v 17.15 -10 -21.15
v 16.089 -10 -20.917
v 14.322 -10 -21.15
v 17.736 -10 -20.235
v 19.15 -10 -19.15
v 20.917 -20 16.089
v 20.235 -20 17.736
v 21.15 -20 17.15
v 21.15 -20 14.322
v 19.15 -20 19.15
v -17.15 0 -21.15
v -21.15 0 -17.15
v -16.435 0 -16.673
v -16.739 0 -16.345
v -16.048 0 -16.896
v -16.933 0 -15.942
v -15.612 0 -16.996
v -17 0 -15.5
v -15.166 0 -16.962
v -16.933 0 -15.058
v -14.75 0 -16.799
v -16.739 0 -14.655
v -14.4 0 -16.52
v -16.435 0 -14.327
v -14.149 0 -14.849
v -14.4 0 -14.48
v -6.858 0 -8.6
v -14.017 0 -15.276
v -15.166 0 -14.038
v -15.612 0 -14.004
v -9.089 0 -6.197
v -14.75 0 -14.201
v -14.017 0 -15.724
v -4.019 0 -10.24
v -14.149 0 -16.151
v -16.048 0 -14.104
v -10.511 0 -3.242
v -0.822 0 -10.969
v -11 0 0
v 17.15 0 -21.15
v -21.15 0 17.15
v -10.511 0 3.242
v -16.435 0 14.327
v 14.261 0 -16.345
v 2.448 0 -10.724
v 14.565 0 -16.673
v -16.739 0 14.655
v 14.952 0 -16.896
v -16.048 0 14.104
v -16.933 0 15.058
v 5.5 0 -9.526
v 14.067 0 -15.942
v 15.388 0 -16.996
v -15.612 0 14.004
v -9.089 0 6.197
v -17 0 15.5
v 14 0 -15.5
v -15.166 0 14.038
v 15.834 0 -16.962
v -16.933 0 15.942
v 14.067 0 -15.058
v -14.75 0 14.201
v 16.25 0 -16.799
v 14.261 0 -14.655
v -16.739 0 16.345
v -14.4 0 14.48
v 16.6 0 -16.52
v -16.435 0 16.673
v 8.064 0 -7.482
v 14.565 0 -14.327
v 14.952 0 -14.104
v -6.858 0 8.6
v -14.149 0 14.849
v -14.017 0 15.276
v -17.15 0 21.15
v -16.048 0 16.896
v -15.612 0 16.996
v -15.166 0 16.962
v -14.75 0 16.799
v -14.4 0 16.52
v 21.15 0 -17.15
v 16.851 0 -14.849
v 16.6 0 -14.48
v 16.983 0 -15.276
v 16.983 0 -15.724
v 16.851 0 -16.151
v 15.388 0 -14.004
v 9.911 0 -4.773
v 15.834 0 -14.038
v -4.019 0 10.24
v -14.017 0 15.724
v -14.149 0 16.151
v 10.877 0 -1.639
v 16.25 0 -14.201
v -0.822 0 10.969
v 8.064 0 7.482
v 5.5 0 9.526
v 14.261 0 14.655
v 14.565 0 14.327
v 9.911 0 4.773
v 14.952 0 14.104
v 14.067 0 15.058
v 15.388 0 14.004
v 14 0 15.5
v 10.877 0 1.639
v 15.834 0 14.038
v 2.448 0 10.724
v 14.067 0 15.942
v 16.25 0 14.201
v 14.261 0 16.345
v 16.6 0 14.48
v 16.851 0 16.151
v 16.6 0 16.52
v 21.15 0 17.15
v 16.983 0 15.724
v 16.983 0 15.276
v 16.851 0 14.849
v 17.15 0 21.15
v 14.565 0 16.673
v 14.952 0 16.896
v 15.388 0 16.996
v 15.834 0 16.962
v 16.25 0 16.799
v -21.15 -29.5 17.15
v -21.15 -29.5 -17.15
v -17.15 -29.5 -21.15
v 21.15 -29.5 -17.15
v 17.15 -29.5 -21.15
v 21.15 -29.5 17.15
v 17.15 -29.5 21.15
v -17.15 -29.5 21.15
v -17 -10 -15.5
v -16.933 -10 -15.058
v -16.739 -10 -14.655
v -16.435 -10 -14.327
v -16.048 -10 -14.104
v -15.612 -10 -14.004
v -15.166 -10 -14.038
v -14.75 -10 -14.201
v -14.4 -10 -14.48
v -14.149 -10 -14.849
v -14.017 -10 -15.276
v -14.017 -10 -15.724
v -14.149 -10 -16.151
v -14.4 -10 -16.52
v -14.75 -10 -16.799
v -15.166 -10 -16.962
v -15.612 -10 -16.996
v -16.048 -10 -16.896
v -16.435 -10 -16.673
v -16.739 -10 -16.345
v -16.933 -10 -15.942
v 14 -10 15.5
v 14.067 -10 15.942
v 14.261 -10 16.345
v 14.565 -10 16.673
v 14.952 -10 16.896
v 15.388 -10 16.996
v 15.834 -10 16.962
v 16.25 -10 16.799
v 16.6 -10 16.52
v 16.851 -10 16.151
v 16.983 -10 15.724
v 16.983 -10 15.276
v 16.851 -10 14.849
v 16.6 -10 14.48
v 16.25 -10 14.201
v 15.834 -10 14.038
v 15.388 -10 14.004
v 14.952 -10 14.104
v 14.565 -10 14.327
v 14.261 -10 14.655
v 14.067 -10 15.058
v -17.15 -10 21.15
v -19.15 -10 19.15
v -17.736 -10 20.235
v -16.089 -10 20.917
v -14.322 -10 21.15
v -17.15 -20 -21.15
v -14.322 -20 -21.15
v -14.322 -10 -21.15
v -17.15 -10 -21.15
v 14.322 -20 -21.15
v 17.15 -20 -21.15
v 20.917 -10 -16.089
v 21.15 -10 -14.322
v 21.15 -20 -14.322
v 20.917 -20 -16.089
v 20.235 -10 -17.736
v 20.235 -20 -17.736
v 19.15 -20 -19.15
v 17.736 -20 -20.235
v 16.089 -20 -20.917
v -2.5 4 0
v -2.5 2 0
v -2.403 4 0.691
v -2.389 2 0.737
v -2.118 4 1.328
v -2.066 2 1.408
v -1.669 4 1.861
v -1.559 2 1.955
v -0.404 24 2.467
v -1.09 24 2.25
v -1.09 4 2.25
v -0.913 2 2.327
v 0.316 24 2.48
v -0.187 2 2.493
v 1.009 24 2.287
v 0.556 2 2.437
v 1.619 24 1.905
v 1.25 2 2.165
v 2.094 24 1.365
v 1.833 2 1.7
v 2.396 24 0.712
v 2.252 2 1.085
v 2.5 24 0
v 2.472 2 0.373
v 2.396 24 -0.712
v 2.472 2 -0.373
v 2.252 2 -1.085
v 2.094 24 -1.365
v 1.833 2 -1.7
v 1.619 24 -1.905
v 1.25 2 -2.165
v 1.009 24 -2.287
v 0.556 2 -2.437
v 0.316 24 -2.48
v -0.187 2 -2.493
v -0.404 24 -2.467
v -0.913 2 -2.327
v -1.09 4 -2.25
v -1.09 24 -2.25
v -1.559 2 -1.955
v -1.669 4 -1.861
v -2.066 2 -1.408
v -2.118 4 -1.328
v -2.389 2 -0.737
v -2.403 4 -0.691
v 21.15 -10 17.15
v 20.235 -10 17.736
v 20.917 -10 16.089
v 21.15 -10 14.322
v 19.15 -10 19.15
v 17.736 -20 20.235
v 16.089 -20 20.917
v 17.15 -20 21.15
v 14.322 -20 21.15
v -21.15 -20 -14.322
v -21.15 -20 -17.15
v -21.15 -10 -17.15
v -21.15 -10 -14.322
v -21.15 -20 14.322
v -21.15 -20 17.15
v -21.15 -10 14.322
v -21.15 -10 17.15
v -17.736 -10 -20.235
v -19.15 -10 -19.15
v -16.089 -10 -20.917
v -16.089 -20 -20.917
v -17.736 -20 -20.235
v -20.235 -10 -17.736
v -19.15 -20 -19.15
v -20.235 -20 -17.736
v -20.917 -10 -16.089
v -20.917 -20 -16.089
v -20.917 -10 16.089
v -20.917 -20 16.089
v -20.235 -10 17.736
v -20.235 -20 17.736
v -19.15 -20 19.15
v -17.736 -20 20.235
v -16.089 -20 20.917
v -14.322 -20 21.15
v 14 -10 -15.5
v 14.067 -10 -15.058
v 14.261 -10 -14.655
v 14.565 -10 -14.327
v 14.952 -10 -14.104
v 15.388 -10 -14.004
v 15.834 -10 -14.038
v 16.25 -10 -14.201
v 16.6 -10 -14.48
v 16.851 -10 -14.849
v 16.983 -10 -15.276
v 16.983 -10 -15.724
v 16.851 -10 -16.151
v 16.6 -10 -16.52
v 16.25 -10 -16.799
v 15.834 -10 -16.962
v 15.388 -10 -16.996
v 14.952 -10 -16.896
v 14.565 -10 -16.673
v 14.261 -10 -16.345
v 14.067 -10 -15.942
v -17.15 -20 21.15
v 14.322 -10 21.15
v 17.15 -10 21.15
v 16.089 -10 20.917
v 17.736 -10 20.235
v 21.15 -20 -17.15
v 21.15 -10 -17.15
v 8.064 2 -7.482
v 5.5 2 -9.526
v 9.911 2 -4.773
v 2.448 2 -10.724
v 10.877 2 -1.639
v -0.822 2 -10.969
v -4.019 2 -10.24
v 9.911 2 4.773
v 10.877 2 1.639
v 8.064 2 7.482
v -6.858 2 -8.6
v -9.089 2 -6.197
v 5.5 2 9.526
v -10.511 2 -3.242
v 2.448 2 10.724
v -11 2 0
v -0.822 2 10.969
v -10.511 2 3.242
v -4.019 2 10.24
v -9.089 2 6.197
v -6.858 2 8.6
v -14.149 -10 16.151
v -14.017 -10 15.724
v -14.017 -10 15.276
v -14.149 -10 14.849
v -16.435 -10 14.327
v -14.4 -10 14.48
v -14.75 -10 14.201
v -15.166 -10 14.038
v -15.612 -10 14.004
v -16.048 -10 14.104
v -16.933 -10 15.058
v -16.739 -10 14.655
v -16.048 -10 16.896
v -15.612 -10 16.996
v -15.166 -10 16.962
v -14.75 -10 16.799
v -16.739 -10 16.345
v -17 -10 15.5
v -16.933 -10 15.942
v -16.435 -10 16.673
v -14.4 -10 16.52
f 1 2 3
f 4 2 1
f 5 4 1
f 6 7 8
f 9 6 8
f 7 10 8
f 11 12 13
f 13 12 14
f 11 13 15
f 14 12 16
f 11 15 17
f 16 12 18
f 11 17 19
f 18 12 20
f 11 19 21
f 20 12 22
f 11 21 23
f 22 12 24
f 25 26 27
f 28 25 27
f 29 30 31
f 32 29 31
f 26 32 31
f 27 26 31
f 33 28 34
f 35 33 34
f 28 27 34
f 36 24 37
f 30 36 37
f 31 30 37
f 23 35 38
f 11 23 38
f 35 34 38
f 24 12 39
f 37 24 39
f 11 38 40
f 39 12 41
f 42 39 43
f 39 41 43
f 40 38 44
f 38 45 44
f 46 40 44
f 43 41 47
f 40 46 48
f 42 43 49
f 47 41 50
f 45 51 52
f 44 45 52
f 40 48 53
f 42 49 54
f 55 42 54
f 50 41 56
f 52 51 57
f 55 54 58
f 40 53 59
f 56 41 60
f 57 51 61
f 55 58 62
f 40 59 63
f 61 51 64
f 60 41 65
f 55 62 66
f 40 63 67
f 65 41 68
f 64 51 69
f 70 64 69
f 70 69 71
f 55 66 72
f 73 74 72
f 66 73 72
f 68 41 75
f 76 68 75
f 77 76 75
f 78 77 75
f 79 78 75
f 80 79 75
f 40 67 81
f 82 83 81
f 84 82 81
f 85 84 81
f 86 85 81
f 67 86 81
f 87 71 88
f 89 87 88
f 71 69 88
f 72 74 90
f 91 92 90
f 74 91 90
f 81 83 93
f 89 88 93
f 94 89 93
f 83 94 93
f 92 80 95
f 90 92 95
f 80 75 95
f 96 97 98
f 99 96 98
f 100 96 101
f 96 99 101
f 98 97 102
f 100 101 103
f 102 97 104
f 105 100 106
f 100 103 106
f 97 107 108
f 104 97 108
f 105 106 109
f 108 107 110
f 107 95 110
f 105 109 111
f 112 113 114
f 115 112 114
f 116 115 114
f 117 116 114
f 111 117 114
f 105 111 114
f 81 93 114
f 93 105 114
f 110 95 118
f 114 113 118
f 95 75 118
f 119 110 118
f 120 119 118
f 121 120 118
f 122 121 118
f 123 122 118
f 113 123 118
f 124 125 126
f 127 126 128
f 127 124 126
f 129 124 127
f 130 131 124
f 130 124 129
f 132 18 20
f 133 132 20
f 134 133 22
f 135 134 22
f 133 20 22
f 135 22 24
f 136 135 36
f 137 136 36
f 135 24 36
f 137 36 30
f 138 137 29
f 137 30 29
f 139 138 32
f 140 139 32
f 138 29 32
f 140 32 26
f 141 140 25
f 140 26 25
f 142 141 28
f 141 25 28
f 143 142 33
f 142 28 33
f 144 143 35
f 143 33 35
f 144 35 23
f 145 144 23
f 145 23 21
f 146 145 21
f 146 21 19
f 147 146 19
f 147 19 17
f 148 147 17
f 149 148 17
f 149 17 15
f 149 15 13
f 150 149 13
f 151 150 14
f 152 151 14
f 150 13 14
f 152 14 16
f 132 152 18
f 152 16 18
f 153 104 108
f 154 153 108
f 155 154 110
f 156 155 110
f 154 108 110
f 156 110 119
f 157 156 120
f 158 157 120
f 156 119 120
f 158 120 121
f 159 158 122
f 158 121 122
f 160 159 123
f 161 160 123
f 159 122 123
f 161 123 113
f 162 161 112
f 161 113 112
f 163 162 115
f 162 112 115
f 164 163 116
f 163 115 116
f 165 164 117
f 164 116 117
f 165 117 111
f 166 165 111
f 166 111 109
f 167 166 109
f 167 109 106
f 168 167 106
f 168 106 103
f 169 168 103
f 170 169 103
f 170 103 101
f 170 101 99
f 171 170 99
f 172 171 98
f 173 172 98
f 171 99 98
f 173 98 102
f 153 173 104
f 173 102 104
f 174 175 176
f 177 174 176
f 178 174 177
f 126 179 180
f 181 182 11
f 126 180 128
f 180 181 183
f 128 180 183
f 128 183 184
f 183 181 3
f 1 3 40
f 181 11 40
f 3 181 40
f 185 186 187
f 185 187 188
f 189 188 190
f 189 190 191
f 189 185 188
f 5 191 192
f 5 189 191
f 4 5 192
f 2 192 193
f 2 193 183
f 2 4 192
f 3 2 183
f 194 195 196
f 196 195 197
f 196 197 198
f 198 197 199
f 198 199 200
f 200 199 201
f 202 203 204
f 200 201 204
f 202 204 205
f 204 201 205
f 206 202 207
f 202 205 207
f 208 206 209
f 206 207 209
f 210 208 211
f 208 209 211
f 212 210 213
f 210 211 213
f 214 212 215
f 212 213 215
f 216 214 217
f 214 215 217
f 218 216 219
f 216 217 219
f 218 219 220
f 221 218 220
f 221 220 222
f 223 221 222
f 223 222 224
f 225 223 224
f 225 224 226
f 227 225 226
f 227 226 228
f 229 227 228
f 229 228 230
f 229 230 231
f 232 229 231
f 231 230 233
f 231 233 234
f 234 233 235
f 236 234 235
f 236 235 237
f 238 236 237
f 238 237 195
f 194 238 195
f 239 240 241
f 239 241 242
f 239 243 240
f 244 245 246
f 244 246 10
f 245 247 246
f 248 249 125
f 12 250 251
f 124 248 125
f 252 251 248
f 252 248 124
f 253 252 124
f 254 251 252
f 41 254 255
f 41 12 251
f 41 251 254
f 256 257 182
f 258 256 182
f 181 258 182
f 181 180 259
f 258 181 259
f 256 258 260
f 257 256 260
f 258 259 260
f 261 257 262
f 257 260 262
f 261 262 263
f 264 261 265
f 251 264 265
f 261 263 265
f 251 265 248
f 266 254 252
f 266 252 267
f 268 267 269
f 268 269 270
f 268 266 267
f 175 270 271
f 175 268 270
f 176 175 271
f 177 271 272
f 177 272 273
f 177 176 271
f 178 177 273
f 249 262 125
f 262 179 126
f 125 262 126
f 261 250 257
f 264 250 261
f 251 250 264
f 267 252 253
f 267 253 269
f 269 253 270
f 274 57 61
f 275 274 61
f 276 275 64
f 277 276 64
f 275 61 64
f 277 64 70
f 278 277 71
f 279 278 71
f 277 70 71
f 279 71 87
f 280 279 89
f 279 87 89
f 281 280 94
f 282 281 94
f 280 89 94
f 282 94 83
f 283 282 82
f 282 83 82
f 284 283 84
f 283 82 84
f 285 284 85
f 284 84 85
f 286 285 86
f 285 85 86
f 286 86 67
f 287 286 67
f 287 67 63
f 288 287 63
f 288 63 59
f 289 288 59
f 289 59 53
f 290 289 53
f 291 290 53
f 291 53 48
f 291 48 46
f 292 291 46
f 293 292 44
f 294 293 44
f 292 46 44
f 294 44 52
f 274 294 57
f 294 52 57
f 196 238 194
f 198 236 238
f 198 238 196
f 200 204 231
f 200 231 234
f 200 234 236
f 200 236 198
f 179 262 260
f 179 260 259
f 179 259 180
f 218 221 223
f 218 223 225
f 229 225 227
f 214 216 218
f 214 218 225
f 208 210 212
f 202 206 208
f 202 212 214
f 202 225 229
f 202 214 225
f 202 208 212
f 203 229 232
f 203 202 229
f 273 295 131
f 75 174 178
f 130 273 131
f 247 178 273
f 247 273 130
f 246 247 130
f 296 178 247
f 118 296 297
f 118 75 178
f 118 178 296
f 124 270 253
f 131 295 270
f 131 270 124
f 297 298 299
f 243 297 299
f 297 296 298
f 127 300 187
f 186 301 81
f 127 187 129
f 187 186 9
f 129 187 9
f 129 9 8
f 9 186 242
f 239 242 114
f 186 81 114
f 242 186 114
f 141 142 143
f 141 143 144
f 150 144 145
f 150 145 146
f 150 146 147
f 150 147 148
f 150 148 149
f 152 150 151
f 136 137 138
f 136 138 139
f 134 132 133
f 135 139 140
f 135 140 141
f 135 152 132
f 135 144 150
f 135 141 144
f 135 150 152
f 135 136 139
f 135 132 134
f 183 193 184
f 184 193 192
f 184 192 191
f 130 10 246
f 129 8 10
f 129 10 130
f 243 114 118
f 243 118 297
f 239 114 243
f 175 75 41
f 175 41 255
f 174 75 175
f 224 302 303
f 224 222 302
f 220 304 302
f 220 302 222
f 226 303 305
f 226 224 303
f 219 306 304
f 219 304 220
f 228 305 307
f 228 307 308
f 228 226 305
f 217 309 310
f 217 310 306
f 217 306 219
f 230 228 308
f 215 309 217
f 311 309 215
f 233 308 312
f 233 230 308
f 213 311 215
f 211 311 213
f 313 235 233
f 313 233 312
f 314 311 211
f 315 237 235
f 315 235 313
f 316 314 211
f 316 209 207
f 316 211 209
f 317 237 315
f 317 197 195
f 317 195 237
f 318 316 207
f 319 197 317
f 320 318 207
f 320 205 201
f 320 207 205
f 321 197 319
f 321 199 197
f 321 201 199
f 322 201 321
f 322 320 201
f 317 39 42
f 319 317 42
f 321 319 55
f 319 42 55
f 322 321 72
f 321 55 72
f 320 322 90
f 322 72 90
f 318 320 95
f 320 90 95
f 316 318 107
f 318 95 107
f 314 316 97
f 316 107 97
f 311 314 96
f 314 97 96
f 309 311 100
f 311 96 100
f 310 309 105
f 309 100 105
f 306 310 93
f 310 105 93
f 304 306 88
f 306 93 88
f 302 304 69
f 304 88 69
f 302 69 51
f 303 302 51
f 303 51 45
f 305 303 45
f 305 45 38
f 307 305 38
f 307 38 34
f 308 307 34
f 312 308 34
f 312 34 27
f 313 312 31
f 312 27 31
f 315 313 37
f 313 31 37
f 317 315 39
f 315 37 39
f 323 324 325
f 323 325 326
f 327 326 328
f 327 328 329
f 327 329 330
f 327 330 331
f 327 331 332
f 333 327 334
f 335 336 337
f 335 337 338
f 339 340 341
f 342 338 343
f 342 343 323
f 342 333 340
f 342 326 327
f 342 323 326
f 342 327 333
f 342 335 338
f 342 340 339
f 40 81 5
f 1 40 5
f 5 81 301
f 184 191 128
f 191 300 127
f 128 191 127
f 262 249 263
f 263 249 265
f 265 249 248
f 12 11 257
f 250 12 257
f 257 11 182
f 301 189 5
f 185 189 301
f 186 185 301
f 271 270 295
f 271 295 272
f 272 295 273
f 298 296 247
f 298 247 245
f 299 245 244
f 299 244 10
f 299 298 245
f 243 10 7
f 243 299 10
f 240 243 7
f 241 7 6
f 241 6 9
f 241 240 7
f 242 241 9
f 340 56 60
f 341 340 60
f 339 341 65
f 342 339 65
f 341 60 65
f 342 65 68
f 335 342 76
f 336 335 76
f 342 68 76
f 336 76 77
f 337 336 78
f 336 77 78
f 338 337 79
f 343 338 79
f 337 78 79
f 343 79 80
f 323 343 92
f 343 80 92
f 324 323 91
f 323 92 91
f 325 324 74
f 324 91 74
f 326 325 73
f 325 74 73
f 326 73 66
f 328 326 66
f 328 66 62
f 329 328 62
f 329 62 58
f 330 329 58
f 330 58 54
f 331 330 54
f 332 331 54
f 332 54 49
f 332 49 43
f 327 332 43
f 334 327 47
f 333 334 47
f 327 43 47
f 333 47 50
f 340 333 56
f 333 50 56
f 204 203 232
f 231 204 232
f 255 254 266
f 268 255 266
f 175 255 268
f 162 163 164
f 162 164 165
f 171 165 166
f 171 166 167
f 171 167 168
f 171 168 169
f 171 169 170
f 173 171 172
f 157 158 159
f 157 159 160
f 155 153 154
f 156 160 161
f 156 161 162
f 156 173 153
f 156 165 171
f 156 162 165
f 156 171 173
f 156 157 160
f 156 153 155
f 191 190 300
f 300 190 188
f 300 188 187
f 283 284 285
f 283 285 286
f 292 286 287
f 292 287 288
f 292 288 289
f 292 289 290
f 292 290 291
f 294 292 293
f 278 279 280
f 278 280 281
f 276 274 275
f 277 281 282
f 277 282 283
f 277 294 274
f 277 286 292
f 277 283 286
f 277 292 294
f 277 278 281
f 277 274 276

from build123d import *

# Parameters (mm, degrees)
F0_W      = 42.3
F0_H      = 42.3
F1_DEPTH  = 29.5
F2_R      = 11
F3_DEPTH  = 2
F4_R      = 2.5
F5_DEPTH  = 22
F7_DEPTH  = 20
F8_SIZE   = 4
F11_DEPTH = 5
F12_R     = 1.5
F13_DEPTH = 10


with BuildPart() as f1:
    # F0 (on Front) → F1 (new body)
    with BuildSketch(Plane.XZ):
        Rectangle(F0_W, F0_H)
    extrude(amount=F1_DEPTH)

    # F2 (on face) → F3 (join)
    with BuildSketch(Plane(origin=(0, 0, 0), x_dir=(-1, 0, 0), z_dir=(0, 1, 0))):
        Circle(F2_R)
    extrude(amount=F3_DEPTH)

    # F4 (on face) → F5 (join)
    with BuildSketch(Plane(origin=(0, 2, 0), x_dir=(-1, 0, 0), z_dir=(0, 1, 0))):
        Circle(F4_R)
    extrude(amount=F5_DEPTH)

    # F6 (on face) → F7 (cut)
    with BuildSketch(Plane(origin=(0, 24, 0), x_dir=(-1, 0, 0), z_dir=(0, 1, 0))):
        with BuildLine():
            ThreePointArc((2.5, 0), (2.1182908015, 1.3277213865), (1.0897247359, 2.25))
            Line((1.0897247359, 2.25), (1.0897247359, -2.25))
            ThreePointArc((1.0897247359, -2.25), (2.1182908015, -1.3277213865), (2.5, 0))
        make_face()
    extrude(amount=-F7_DEPTH, mode=Mode.SUBTRACT)

    # F8
    f8_edges = [f1.edges().sort_by_distance(p)[0] for p in [
        (-21.15, -14.75, 21.15),
        (-21.15, -14.75, -21.15),
        (21.15, -14.75, -21.15),
        (21.15, -14.75, 21.15),
    ]]
    chamfer(f8_edges, length=F8_SIZE)

    # F10 (on offset) → F11 (cut, symmetric)
    with BuildSketch(Plane.XZ.offset(15)):
        with BuildLine():
            ThreePointArc((14.3215728753, 21.15), (19.15, 19.15), (21.15, 14.3215728753))
            Line((21.15, 14.3215728753), (21.15, 21.15))
            Line((21.15, 21.15), (14.3215728753, 21.15))
        make_face()
        with BuildLine():
            Line((-21.15, 21.15), (-21.15, 14.3215728753))
            ThreePointArc((-21.15, 14.3215728753), (-19.15, 19.15), (-14.3215728753, 21.15))
            Line((-14.3215728753, 21.15), (-21.15, 21.15))
        make_face()
        with BuildLine():
            Line((21.15, -21.15), (21.15, -14.3215728753))
            ThreePointArc((21.15, -14.3215728753), (19.15, -19.15), (14.3215728753, -21.15))
            Line((14.3215728753, -21.15), (21.15, -21.15))
        make_face()
        with BuildLine():
            ThreePointArc((-14.3215728753, -21.15), (-19.15, -19.15), (-21.15, -14.3215728753))
            Line((-21.15, -14.3215728753), (-21.15, -21.15))
            Line((-21.15, -21.15), (-14.3215728753, -21.15))
        make_face()
    extrude(amount=F11_DEPTH, both=True, mode=Mode.SUBTRACT)

    # F12 (on face) → F13 (cut)
    with BuildSketch(Plane(origin=(0, 0, 0), x_dir=(-1, 0, 0), z_dir=(0, 1, 0))):
        with Locations((-15.5, 15.5)):
            Circle(F12_R)
        with Locations((15.5, 15.5)):
            Circle(F12_R)
        with Locations((-15.5, -15.5)):
            Circle(F12_R)
        with Locations((15.5, -15.5)):
            Circle(F12_R)
    extrude(amount=-F13_DEPTH, mode=Mode.SUBTRACT)


solid = f1.part
